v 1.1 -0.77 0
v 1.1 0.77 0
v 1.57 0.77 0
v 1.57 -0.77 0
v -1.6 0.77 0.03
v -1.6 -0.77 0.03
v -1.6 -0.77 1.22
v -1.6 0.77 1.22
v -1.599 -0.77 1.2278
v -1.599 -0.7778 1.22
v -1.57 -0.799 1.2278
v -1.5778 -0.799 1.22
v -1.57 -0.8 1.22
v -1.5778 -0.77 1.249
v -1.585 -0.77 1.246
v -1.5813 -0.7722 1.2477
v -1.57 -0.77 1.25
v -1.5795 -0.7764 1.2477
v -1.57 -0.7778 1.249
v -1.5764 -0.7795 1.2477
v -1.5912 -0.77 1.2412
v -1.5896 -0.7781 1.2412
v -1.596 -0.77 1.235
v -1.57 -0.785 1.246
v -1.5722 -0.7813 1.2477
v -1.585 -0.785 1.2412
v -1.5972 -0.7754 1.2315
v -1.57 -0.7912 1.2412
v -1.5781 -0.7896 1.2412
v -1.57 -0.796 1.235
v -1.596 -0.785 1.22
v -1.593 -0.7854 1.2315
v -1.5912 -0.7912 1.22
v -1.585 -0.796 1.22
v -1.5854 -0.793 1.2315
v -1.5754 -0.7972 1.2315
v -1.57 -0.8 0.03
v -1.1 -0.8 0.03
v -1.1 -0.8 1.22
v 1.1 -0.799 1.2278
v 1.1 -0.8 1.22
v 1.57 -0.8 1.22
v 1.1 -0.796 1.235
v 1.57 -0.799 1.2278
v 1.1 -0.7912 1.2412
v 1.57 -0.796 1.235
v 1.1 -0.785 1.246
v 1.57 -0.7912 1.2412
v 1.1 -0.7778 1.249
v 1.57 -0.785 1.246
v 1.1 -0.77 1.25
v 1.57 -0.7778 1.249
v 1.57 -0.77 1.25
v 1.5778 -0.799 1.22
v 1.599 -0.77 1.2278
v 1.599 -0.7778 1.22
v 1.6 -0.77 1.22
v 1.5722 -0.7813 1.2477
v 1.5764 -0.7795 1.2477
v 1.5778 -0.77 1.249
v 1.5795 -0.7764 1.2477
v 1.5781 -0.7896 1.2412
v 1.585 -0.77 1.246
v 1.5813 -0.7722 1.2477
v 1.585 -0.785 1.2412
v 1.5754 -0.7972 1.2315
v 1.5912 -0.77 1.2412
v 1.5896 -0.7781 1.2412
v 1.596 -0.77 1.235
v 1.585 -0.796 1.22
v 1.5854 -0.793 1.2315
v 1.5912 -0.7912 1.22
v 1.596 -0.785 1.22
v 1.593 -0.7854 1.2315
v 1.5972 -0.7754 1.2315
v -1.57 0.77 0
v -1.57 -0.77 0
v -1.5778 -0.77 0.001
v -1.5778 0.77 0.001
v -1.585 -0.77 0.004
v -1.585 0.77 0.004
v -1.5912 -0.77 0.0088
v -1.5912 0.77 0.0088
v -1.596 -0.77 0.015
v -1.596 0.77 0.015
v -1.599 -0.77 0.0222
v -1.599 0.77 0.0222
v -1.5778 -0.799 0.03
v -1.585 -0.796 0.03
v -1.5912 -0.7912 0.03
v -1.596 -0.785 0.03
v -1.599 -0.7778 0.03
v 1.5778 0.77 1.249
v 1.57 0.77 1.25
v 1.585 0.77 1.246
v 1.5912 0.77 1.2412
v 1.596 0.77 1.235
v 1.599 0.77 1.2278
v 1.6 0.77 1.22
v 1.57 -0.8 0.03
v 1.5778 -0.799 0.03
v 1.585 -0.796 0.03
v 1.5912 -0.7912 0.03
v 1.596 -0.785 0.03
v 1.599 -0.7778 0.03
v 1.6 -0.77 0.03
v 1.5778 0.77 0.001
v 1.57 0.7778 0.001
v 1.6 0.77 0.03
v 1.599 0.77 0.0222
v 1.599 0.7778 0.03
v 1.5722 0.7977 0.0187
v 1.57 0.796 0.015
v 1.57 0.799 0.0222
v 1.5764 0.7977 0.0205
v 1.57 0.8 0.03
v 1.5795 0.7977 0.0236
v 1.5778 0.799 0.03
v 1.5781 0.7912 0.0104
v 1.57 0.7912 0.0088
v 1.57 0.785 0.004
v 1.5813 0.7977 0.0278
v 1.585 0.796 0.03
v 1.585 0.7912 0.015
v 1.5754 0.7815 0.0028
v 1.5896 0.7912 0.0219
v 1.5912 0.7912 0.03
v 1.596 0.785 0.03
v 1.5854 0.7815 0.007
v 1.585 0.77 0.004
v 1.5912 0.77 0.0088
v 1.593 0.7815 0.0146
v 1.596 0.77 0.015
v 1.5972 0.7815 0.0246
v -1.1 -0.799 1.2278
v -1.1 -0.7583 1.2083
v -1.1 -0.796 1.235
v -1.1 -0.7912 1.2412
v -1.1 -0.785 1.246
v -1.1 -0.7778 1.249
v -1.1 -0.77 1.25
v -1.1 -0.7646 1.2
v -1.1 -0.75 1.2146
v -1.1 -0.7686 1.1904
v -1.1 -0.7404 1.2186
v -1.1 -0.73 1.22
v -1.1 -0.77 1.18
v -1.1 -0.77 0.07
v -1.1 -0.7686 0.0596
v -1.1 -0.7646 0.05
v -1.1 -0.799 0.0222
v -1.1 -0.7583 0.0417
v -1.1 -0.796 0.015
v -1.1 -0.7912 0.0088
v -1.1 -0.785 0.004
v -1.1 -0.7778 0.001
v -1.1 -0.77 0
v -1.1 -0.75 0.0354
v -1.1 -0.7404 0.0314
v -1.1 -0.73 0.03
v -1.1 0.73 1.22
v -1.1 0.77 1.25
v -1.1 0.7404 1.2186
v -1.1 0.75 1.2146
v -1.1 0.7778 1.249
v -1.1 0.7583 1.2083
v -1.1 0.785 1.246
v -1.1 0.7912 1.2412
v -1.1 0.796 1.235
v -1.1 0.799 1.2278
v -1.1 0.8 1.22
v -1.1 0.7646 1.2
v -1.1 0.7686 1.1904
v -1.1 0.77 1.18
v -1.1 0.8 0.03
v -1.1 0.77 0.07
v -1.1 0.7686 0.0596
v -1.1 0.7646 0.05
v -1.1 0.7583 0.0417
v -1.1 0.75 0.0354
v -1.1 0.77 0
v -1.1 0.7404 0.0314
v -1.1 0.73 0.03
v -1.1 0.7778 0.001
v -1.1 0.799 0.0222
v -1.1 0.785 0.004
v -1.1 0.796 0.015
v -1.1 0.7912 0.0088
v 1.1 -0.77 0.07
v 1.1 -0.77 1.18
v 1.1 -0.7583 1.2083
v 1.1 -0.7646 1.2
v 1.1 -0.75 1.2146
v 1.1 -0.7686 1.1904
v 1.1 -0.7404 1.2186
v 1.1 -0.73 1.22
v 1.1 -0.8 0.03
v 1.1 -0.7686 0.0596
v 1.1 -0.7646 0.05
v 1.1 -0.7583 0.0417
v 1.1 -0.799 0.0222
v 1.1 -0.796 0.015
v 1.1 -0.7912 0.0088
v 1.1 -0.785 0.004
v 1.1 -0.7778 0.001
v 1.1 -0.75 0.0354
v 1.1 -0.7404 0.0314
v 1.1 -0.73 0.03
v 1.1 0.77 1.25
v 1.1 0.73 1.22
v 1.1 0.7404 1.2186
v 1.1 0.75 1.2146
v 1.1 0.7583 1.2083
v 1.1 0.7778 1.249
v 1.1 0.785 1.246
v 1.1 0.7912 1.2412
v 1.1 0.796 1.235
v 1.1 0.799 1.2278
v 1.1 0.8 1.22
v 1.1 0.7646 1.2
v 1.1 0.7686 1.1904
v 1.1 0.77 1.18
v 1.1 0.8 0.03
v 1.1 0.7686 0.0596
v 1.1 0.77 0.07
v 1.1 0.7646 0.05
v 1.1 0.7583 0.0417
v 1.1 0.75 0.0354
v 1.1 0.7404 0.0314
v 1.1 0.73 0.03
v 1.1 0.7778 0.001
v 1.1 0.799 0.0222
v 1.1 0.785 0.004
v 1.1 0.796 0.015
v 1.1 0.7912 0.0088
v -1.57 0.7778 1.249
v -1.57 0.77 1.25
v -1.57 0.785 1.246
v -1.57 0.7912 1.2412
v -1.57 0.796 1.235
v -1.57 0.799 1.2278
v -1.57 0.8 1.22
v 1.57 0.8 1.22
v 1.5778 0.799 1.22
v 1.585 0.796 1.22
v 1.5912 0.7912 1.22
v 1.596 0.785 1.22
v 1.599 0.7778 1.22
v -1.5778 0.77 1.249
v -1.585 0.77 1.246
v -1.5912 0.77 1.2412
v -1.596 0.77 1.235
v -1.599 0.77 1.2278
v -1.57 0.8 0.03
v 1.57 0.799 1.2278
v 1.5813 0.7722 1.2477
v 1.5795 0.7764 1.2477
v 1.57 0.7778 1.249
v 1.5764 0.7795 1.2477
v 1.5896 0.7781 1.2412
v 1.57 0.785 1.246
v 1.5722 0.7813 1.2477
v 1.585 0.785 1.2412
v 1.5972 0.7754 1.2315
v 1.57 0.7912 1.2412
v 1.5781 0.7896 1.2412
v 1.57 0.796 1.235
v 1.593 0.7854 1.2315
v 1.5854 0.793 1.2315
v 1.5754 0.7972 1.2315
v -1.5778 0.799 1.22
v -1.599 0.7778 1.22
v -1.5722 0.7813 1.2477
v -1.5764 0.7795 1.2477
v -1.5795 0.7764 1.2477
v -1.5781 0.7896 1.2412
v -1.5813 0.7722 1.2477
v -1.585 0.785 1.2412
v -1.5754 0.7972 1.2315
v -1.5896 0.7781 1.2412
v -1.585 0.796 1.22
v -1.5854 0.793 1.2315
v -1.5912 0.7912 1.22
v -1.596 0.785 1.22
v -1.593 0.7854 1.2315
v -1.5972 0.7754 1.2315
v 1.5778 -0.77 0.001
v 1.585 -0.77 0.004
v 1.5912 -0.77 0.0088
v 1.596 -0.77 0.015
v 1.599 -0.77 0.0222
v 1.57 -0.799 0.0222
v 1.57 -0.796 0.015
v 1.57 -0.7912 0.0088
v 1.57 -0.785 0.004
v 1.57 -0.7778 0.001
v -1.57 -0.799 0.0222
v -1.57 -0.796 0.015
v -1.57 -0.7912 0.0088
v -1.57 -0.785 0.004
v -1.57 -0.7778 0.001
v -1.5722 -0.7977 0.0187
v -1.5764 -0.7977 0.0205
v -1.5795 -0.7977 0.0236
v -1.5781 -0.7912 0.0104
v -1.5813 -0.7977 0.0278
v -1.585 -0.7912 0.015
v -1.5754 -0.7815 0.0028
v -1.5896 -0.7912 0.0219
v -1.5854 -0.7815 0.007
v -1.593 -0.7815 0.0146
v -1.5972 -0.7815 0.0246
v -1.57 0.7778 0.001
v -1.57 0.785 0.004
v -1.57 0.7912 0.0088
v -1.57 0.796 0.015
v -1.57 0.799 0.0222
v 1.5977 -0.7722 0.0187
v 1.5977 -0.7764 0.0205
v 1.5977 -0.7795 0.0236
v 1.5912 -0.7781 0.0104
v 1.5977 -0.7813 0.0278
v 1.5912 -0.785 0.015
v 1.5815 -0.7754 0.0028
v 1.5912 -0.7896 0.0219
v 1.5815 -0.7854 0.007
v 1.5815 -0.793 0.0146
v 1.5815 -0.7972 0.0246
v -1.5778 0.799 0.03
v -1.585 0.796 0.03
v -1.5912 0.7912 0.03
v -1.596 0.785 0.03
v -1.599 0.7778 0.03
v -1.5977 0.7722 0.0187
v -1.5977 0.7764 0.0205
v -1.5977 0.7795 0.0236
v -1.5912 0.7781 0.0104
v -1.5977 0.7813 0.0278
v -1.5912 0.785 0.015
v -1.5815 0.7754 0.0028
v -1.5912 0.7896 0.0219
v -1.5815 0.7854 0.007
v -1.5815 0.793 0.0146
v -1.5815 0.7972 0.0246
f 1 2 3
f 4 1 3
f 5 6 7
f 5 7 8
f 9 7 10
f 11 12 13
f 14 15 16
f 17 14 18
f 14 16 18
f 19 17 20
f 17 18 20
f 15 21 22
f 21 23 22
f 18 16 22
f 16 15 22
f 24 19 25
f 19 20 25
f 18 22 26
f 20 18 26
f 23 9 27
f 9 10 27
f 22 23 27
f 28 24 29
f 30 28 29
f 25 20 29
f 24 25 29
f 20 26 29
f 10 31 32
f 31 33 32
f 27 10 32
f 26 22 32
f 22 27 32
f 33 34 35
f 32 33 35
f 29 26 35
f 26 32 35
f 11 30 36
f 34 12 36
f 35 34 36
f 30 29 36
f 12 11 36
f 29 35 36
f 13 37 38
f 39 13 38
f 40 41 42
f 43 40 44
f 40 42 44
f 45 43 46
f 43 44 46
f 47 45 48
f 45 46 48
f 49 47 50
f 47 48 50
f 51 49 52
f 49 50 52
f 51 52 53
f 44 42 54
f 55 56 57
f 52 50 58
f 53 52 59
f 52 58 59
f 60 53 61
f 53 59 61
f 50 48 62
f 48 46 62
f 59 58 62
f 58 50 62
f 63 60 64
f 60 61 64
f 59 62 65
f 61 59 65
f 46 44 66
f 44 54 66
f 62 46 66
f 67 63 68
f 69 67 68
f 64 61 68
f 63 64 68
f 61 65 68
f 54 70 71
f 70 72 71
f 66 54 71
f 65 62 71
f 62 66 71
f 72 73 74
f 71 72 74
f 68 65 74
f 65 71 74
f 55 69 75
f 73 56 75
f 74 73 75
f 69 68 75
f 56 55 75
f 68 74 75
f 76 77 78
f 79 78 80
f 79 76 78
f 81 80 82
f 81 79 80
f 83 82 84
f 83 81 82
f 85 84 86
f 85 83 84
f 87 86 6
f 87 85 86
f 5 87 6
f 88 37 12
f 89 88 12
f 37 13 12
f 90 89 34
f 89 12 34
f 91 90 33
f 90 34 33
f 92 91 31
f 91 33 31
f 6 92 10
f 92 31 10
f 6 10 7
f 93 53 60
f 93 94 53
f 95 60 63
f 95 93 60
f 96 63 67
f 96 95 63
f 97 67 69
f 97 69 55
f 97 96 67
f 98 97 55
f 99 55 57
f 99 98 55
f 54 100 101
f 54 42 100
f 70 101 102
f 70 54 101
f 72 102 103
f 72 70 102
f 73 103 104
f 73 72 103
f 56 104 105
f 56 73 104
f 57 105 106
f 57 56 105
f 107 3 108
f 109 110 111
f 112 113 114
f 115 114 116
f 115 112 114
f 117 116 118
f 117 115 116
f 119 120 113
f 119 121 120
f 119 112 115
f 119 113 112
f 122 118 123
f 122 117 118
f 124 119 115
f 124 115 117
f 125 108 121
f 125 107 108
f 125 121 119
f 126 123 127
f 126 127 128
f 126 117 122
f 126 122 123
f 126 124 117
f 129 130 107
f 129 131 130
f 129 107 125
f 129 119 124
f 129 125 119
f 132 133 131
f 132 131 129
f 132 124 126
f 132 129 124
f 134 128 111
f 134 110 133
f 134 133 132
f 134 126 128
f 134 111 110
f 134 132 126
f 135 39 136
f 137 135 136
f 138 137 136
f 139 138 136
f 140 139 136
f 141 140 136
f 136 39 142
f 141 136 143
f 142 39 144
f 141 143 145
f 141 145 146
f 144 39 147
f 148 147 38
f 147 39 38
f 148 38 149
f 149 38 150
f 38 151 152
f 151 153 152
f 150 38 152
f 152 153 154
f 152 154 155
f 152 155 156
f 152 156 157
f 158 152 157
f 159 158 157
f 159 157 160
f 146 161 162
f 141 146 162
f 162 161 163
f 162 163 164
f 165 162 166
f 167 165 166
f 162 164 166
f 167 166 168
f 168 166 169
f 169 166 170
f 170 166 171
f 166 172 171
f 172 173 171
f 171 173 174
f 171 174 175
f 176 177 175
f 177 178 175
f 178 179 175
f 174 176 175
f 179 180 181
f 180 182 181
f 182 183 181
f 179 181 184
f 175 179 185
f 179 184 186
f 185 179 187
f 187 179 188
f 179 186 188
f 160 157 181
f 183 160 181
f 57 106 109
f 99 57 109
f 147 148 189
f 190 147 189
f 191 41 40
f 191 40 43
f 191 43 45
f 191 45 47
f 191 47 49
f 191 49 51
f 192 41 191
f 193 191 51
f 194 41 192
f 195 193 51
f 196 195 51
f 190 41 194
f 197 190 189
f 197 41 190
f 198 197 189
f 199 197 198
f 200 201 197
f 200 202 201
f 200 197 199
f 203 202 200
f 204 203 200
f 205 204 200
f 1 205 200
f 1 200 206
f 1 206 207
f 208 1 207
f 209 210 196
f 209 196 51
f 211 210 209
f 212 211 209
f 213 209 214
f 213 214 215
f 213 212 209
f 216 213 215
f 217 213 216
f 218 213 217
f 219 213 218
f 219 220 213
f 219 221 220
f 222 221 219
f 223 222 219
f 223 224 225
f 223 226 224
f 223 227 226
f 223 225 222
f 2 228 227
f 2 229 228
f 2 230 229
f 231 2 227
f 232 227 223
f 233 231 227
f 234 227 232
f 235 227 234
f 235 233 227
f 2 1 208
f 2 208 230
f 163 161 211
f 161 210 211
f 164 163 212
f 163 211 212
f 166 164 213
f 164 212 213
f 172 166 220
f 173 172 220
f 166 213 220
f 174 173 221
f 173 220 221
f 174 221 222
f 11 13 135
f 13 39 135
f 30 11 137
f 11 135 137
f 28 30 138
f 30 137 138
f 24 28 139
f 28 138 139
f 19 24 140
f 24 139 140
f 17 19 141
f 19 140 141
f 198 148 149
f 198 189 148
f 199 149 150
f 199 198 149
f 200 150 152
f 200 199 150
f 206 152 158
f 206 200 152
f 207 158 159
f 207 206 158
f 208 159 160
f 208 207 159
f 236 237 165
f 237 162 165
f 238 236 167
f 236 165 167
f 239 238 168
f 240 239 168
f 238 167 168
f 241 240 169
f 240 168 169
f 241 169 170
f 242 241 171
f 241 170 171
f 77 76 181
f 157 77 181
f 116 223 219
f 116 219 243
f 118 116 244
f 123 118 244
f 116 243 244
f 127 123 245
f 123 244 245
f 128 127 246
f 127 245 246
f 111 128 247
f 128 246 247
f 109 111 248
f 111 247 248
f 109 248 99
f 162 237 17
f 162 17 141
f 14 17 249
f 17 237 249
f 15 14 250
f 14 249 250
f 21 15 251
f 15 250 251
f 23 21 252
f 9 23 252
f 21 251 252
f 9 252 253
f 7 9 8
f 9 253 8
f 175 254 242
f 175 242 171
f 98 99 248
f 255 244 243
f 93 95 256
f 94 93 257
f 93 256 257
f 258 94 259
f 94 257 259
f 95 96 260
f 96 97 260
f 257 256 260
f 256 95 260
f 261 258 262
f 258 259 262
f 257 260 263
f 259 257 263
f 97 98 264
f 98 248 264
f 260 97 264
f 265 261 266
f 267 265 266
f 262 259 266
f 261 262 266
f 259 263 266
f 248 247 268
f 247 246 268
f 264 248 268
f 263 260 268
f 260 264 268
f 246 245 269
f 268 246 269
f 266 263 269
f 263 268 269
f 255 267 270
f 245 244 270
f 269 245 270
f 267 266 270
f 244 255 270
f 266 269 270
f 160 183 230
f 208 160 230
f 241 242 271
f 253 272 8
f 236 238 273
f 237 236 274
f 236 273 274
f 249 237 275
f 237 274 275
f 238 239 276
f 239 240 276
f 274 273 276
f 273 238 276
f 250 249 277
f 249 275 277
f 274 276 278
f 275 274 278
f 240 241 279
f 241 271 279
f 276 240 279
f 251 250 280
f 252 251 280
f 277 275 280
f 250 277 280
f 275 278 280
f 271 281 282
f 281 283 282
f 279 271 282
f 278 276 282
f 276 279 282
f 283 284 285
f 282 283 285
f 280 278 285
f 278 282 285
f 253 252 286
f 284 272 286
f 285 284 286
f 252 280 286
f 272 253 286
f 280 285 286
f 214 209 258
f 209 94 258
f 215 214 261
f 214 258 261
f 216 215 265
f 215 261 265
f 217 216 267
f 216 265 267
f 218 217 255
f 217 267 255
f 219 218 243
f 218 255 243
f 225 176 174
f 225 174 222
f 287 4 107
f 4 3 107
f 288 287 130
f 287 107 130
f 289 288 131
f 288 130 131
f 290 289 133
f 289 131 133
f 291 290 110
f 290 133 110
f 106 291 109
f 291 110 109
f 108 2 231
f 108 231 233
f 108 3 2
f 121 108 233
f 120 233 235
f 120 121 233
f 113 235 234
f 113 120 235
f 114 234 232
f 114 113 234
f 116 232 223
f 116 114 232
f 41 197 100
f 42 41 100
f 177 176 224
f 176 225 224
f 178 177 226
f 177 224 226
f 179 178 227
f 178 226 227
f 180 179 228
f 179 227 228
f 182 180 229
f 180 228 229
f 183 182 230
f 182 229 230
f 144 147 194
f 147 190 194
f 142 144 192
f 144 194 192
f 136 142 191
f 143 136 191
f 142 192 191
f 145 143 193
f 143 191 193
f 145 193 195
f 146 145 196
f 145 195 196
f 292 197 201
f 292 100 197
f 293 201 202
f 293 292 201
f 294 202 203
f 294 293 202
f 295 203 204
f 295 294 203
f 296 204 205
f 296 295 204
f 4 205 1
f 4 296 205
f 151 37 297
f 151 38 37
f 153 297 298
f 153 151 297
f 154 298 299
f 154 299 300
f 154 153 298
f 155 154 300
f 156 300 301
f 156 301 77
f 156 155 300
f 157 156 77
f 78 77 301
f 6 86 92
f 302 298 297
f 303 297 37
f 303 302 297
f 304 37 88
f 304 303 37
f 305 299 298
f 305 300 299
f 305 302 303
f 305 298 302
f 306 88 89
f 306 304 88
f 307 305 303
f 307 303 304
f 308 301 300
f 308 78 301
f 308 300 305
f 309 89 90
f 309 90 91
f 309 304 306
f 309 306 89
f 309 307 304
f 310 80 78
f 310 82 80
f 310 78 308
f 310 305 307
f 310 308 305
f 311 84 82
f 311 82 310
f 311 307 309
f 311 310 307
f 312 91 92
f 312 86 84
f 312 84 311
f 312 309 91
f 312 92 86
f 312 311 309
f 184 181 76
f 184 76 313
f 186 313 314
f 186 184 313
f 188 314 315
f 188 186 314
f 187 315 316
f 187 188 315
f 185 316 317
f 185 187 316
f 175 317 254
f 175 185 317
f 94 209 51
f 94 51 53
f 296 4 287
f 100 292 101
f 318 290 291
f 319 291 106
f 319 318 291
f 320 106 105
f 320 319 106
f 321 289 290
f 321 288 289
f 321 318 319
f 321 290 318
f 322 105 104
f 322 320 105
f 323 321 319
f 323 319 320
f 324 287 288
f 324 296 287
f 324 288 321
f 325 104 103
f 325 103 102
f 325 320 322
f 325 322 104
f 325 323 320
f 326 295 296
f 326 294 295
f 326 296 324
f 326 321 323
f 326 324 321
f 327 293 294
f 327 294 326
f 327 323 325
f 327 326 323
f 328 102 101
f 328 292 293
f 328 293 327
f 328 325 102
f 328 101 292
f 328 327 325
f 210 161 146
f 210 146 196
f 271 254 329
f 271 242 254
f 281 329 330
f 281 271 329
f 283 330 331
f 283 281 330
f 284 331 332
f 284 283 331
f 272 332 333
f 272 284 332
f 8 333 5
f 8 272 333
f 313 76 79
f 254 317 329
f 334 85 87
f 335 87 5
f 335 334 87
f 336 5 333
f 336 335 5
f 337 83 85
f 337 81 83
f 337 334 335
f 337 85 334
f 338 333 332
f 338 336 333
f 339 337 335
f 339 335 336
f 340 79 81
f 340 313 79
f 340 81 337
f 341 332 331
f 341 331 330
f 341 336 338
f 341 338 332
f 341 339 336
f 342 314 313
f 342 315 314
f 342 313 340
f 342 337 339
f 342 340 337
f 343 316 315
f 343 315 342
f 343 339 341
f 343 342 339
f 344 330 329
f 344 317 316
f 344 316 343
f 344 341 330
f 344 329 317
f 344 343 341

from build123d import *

# Parameters (mm, degrees)
EXTRUDE_START   = 0.03
SKETCH_2_W      = 2.2
SKETCH_2_H      = 1.54
EXTRUDE_2_DEPTH = 1.19
SKETCH_3_W      = 0.5
SKETCH_3_H      = 1.6
EXTRUDE_3_DEPTH = 1.25
FILLET_1_R      = 0.04
FILLET_2_R      = 0.03


with BuildPart() as part:
    # Эскиз2 → Вытянуть2 (new body)
    with BuildSketch(Plane.XY.offset(EXTRUDE_START)):
        Rectangle(SKETCH_2_W, SKETCH_2_H)
    extrude(amount=EXTRUDE_2_DEPTH)

    # Эскиз3 → Вытянуть3 (add)
    with BuildSketch(Plane.XY):
        with Locations((1.35, 0)):
            Rectangle(SKETCH_3_W, SKETCH_3_H)
        with Locations((-1.35, 0)):
            Rectangle(SKETCH_3_W, SKETCH_3_H)
    extrude(amount=EXTRUDE_3_DEPTH)

    # Скругление1
    fillet_1_edges = [part.edges().sort_by_distance(p)[0] for p in [
        (0, -0.77, 1.22),
        (0, -0.77, 0.03),
        (0, 0.77, 0.03),
        (0, 0.77, 1.22),
    ]]
    fillet(fillet_1_edges, radius=FILLET_1_R)

    # Скругление2
    fillet_2_edges = [part.edges().sort_by_distance(p)[0] for p in [
        (1.35, -0.8, 0),
        (1.6, 0, 0),
        (1.6, -0.8, 0.625),
        (1.35, 0.8, 0),
        (1.6, 0.8, 0.625),
        (1.35, -0.8, 1.25),
        (1.6, 0, 1.25),
        (1.35, 0.8, 1.25),
        (-1.35, 0.8, 0),
        (-1.6, 0, 0),
        (-1.6, 0.8, 0.625),
        (-1.35, -0.8, 0),
        (-1.6, -0.8, 0.625),
        (-1.35, 0.8, 1.25),
        (-1.6, 0, 1.25),
        (-1.35, -0.8, 1.25),
    ]]
    fillet(fillet_2_edges, radius=FILLET_2_R)


solid = part.part
